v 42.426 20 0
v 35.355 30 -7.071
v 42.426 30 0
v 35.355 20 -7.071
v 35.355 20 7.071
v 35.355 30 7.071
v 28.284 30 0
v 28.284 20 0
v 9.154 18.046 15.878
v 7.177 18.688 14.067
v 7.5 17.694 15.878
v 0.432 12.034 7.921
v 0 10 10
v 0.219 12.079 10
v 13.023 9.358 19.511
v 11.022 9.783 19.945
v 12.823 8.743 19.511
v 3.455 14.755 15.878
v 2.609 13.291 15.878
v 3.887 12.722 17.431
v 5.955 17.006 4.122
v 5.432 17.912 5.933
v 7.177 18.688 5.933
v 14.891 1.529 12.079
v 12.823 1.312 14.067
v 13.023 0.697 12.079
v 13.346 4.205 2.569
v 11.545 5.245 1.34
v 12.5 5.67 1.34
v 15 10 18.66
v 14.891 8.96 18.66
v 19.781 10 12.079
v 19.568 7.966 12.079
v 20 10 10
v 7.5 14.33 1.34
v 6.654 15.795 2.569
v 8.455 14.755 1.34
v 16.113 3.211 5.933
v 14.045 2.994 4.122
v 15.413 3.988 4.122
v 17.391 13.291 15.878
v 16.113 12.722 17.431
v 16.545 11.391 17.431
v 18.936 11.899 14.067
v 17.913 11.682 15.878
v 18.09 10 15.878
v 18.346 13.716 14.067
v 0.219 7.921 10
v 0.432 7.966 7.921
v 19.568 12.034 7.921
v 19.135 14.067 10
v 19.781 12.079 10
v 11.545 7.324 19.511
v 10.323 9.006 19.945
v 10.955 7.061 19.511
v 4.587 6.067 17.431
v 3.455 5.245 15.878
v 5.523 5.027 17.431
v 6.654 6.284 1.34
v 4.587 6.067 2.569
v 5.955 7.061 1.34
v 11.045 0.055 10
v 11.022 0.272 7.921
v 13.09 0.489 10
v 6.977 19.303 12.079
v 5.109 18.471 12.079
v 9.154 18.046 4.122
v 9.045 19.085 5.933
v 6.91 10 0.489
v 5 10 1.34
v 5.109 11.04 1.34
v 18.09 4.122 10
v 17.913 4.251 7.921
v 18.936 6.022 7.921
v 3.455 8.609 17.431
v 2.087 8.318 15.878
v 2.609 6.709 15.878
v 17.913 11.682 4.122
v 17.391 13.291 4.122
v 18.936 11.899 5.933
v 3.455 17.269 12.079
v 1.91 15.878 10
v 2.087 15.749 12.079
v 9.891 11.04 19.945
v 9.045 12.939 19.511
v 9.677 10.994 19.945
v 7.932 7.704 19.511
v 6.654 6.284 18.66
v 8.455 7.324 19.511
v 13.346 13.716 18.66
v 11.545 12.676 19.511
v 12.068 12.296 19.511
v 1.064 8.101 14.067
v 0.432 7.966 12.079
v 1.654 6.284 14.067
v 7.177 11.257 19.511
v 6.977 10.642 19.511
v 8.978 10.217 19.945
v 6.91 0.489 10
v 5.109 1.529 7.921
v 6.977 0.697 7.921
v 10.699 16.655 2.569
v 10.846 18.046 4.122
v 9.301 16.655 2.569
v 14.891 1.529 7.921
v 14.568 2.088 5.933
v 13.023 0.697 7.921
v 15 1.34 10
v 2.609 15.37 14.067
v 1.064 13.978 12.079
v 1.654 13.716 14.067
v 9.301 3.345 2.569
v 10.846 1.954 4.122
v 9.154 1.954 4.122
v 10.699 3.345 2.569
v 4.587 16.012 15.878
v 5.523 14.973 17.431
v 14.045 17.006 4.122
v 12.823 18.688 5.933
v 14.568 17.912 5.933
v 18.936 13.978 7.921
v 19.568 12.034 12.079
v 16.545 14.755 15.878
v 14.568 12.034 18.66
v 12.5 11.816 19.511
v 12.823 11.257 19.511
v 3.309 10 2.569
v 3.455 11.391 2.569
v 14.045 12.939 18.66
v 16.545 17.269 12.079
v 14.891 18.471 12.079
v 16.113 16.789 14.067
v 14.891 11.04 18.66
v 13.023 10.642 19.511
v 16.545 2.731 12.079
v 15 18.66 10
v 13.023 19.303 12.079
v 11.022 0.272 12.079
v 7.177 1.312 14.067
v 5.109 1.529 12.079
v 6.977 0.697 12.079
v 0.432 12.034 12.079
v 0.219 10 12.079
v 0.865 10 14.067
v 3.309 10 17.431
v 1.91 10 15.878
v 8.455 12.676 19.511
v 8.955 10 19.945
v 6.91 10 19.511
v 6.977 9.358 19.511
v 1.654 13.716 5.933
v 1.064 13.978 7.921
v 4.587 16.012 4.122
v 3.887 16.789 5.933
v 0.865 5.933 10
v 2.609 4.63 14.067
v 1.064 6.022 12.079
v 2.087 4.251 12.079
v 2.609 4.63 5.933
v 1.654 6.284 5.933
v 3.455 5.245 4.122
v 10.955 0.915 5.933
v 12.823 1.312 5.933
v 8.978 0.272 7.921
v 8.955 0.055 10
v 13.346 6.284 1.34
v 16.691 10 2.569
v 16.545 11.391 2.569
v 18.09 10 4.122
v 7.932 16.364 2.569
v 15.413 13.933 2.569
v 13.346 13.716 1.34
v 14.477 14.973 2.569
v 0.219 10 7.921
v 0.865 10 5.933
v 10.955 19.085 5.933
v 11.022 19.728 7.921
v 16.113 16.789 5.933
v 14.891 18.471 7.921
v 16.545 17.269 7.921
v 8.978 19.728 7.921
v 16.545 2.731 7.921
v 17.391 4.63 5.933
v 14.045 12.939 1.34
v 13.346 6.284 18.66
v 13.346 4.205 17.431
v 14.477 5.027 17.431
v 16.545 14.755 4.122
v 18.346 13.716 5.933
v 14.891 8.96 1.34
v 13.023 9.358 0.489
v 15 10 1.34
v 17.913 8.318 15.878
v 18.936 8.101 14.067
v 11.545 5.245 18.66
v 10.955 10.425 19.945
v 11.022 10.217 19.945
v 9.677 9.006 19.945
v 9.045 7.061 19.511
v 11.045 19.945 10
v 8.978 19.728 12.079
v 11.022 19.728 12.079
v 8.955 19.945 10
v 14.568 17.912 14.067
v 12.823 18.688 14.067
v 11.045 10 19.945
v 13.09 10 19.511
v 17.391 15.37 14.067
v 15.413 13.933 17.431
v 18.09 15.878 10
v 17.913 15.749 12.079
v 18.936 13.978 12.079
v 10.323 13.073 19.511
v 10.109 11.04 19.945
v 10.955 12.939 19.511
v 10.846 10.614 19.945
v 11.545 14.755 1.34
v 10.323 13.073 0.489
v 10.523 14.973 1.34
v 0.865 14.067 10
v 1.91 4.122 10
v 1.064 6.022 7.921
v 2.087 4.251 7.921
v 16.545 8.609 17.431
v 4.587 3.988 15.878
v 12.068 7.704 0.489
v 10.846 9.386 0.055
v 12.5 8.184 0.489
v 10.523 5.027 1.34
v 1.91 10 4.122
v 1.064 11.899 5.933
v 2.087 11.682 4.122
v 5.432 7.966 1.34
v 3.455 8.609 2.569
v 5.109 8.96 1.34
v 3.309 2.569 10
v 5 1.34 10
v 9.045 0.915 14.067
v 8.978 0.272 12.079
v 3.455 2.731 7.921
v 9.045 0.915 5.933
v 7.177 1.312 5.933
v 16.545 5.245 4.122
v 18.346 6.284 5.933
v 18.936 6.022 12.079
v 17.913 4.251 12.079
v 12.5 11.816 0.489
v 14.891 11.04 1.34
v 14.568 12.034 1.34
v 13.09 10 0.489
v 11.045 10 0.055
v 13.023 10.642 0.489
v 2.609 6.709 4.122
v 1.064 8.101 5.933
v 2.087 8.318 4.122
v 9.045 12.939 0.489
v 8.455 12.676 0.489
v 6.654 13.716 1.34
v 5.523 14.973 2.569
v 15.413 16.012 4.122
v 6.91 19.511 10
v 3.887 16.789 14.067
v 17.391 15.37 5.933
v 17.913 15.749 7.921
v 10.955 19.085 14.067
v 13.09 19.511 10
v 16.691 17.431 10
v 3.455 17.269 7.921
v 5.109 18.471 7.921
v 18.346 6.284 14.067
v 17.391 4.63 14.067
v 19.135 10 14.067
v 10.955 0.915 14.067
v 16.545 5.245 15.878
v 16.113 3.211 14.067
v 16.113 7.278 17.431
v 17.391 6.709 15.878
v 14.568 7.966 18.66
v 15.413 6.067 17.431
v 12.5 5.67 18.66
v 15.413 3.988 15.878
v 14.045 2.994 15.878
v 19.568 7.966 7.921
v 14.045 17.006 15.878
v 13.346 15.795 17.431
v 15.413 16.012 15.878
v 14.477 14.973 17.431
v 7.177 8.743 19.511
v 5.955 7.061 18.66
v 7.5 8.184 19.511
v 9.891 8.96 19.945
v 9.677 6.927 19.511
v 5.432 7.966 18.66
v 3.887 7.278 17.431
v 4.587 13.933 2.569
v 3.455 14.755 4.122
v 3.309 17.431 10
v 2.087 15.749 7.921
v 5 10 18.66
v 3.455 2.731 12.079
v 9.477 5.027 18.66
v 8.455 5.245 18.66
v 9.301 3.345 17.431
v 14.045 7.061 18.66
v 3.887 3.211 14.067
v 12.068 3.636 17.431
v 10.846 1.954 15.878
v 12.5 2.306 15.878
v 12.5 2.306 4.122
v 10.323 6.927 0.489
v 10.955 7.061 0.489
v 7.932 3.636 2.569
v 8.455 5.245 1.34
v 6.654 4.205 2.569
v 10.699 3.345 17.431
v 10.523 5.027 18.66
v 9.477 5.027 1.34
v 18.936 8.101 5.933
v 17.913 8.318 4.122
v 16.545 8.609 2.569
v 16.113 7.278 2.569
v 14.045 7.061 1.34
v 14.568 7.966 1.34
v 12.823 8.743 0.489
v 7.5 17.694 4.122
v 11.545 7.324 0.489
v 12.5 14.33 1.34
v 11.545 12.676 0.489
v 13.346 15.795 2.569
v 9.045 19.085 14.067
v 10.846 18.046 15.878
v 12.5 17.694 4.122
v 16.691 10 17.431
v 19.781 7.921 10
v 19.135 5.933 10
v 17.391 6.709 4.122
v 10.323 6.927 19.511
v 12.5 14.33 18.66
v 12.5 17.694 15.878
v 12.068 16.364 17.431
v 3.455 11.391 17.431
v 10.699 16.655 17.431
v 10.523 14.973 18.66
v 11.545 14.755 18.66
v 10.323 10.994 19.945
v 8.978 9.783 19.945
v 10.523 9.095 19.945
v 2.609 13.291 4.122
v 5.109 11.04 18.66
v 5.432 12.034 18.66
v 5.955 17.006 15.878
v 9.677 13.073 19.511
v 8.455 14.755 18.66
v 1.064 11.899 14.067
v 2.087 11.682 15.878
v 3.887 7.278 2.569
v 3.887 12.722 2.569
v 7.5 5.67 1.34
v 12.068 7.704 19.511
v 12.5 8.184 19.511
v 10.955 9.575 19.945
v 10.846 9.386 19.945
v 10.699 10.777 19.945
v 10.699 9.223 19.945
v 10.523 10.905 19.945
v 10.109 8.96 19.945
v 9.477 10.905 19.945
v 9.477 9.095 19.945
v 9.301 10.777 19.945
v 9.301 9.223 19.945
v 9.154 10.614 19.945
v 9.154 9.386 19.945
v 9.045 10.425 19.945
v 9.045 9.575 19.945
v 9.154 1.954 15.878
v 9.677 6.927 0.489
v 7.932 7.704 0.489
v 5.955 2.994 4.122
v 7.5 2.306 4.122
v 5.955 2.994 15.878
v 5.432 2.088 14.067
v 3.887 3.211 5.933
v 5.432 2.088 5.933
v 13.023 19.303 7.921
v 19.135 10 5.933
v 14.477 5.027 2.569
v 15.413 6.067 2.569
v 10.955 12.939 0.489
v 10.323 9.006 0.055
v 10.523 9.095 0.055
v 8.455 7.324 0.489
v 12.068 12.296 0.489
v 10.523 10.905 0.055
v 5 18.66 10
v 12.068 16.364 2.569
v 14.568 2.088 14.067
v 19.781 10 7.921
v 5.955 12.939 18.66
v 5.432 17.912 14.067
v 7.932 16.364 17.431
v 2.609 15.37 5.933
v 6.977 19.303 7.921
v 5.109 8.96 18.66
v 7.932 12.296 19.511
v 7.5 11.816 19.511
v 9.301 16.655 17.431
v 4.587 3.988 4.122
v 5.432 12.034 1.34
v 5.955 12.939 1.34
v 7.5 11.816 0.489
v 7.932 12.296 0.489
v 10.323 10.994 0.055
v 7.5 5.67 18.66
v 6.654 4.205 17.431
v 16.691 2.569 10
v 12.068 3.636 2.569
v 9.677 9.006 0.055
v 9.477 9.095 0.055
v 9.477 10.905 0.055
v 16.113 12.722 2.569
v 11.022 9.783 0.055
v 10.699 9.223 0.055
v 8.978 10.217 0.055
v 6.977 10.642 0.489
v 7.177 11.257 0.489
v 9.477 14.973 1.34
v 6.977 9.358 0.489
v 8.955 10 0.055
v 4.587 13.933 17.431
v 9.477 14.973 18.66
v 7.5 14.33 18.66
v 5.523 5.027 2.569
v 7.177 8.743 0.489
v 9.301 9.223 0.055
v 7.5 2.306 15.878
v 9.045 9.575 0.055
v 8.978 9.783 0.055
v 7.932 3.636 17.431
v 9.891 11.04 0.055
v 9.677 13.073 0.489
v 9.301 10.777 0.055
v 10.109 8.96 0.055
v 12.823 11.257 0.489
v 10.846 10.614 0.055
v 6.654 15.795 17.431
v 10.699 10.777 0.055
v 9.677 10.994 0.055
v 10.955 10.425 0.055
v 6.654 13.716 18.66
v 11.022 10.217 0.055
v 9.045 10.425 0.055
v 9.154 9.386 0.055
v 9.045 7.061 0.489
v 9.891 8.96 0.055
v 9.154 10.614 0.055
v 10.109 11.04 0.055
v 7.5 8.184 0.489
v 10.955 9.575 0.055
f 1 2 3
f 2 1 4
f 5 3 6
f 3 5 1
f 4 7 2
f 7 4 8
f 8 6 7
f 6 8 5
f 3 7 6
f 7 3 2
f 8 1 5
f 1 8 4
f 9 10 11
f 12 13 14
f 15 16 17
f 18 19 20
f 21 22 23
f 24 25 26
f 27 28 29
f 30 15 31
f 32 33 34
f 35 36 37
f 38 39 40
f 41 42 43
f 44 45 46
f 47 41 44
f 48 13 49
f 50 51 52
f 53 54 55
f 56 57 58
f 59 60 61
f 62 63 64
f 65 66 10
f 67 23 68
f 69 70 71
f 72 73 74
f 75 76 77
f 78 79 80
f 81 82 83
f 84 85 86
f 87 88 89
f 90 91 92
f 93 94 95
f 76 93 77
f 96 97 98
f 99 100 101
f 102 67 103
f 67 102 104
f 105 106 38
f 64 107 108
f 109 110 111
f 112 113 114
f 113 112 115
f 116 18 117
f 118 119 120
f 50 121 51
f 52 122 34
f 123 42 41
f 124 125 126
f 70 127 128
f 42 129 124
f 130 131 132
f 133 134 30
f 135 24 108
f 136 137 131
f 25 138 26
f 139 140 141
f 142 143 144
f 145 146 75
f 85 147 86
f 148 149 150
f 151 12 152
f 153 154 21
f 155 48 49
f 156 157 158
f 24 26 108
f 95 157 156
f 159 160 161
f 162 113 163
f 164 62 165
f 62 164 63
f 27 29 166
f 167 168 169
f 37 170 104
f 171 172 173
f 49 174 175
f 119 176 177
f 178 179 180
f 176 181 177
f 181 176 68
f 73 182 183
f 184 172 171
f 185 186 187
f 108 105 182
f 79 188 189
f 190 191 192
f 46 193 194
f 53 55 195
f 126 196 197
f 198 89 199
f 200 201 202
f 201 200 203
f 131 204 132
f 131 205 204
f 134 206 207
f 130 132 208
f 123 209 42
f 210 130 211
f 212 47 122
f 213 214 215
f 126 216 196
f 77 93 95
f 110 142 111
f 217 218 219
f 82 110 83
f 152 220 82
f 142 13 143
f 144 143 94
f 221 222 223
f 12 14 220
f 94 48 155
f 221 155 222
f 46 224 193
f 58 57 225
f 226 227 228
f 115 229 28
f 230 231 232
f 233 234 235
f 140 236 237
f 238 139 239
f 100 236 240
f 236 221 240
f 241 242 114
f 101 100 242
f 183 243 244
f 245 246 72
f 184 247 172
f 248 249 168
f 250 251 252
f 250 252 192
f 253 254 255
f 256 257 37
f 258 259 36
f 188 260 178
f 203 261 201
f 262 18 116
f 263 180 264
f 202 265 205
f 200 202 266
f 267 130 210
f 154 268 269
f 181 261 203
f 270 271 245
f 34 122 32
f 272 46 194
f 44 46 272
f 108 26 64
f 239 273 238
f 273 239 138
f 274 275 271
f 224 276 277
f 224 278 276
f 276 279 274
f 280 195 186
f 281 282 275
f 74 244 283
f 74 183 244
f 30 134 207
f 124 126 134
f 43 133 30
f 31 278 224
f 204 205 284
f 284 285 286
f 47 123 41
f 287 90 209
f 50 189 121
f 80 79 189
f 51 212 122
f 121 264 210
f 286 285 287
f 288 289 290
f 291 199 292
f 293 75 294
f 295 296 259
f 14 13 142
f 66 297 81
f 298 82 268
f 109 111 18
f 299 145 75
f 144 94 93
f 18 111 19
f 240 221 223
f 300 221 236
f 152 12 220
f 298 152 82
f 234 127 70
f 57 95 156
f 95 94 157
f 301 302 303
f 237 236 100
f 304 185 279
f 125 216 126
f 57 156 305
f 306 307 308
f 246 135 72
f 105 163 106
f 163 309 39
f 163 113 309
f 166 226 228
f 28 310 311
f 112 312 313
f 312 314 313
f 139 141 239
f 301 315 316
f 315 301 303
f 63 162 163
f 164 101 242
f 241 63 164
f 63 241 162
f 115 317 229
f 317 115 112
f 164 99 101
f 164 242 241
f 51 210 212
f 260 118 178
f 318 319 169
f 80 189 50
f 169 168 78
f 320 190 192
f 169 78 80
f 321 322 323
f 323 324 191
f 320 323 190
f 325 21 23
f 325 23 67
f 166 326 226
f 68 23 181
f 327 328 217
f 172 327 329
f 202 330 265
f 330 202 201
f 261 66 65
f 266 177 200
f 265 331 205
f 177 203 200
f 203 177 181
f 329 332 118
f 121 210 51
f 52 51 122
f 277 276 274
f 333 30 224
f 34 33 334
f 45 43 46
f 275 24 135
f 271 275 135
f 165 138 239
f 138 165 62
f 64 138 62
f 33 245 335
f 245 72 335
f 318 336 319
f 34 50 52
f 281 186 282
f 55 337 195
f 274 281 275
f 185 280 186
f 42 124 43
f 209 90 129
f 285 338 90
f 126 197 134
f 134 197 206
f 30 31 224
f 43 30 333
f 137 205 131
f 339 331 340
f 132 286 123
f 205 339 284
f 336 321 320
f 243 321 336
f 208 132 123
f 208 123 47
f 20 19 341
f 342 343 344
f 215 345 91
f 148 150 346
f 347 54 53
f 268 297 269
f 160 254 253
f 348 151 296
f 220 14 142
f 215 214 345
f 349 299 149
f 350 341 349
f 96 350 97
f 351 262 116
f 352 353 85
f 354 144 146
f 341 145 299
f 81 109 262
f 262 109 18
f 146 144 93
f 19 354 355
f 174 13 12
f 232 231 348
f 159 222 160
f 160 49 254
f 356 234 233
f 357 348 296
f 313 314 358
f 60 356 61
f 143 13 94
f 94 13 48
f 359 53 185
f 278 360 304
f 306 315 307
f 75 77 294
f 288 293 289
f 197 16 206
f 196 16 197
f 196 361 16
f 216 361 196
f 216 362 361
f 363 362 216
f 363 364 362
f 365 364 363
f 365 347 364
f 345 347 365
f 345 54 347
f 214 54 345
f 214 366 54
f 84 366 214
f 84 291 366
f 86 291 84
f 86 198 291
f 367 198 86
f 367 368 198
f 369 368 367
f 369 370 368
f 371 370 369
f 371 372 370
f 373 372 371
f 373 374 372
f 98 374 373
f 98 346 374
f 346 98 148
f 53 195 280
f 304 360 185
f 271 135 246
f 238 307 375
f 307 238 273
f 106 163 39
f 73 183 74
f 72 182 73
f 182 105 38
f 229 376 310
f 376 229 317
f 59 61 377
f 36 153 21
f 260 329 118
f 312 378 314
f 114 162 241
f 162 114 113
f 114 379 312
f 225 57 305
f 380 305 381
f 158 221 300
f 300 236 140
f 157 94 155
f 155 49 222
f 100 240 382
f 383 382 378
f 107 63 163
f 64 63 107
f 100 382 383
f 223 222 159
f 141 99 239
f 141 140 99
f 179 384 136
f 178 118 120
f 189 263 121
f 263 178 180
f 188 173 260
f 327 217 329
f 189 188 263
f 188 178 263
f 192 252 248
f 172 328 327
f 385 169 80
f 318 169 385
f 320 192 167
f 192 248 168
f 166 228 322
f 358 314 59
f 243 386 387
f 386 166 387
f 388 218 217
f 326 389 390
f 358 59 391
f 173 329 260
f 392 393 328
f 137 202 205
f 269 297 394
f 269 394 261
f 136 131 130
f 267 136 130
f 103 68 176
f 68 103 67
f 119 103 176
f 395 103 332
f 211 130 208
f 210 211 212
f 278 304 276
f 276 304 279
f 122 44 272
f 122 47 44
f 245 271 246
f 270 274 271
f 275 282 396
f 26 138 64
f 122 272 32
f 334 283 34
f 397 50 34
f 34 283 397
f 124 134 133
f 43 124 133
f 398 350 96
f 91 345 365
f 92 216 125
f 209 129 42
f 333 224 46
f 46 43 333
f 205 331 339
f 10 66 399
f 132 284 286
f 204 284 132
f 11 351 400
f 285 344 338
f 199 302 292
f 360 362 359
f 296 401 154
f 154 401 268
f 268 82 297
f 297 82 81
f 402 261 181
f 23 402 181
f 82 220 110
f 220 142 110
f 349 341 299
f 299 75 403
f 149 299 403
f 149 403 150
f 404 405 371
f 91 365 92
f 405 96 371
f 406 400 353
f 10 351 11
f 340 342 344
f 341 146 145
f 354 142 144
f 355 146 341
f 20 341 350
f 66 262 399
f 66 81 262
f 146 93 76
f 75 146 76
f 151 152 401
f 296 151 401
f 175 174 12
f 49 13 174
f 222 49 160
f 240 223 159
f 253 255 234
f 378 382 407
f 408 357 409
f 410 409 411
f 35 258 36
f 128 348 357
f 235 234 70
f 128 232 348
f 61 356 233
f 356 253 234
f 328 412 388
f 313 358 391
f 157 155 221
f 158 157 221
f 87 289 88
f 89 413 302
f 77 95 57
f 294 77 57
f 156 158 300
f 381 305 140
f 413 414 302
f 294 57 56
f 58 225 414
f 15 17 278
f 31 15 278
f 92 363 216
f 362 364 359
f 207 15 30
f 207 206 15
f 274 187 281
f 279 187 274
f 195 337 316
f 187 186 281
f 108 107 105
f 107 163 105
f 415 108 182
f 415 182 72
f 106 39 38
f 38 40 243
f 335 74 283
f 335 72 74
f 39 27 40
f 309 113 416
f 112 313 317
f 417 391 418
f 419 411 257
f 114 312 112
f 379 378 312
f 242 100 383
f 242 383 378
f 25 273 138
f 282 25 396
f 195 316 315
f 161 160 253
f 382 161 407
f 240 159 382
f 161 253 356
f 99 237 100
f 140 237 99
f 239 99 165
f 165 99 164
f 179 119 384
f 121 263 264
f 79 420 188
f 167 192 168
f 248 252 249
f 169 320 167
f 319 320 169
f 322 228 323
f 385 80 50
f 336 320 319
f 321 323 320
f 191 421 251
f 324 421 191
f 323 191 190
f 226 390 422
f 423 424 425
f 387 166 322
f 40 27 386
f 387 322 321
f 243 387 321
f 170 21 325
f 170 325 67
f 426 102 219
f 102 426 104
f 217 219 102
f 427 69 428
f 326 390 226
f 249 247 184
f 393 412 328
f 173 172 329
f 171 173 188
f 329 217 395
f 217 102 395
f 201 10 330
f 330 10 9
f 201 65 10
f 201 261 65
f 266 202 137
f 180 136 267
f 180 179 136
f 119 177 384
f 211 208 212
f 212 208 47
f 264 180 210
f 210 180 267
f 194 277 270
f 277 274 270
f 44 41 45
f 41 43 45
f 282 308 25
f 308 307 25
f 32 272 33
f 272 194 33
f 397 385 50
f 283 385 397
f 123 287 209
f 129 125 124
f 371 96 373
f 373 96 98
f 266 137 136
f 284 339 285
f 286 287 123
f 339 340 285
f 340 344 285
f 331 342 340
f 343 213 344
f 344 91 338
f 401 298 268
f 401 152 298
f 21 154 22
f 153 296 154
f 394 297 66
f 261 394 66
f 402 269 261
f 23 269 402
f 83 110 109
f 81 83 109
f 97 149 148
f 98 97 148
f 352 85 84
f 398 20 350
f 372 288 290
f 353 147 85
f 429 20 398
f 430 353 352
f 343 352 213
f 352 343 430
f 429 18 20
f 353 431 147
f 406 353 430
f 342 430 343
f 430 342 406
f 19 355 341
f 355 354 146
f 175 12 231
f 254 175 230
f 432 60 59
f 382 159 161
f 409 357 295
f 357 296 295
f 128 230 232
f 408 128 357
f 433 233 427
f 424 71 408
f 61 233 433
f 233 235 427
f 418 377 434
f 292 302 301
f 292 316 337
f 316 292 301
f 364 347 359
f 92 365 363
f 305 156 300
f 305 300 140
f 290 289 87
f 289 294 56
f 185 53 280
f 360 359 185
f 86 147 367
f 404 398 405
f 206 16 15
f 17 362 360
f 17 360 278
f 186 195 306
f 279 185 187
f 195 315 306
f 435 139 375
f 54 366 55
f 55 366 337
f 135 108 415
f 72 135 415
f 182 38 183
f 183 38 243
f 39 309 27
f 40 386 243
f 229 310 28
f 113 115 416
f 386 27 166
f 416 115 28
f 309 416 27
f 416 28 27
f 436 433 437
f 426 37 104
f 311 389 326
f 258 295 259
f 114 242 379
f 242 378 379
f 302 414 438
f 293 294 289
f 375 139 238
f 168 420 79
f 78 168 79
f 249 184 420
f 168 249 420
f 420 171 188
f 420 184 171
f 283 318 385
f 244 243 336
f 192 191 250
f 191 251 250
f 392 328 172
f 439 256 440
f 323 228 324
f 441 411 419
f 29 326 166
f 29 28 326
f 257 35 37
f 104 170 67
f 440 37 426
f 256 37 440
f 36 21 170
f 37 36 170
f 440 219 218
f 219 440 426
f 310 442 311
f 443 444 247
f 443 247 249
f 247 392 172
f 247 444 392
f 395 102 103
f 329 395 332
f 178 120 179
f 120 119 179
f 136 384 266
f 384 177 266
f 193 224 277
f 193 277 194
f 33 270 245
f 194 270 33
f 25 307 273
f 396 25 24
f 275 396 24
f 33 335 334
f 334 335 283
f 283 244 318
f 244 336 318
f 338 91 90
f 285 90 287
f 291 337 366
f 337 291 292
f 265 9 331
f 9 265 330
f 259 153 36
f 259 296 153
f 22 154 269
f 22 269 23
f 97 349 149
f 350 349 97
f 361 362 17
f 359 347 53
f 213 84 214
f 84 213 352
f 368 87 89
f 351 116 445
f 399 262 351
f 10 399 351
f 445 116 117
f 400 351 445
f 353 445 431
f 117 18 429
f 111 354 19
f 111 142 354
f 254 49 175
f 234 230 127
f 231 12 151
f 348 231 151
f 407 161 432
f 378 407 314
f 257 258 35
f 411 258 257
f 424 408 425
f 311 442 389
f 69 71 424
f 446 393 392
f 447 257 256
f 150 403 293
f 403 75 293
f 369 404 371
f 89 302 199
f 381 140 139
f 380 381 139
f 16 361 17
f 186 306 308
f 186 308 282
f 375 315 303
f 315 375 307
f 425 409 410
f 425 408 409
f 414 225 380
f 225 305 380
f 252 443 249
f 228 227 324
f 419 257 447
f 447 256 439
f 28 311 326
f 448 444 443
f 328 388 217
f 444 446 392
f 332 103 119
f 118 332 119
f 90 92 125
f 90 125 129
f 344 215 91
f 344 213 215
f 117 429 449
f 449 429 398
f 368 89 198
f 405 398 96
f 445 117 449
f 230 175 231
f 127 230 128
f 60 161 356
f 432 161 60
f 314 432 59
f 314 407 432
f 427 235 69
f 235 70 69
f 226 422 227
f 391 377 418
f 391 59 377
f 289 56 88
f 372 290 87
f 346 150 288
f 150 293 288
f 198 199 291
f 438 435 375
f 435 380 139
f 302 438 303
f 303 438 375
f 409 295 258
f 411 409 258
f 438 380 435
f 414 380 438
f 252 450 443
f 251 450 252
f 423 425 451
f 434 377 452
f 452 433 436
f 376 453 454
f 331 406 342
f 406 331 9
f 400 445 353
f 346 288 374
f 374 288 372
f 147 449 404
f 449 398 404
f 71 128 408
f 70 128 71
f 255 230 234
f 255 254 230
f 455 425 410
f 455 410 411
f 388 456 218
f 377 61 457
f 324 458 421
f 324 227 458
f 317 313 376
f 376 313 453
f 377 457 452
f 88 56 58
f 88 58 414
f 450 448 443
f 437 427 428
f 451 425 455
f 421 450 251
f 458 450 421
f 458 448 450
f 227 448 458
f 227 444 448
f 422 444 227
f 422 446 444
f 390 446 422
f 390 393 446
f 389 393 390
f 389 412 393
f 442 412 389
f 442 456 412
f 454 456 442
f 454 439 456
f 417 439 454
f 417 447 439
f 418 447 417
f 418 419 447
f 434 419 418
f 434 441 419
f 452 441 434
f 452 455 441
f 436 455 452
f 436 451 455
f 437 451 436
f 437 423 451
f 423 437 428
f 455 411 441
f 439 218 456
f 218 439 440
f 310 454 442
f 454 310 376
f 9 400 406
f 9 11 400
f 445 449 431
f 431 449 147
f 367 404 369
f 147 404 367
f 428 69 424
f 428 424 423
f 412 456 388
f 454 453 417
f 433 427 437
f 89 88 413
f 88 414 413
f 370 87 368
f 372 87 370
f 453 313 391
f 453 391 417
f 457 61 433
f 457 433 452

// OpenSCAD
render()
    color("red")
        rotate([0, 45, 0])
            translate([20, 20, 20])
                cube([10, 10, 10]);

translate([10, 10, 10]) {
    color("green")
        sphere(r = 10);
}
